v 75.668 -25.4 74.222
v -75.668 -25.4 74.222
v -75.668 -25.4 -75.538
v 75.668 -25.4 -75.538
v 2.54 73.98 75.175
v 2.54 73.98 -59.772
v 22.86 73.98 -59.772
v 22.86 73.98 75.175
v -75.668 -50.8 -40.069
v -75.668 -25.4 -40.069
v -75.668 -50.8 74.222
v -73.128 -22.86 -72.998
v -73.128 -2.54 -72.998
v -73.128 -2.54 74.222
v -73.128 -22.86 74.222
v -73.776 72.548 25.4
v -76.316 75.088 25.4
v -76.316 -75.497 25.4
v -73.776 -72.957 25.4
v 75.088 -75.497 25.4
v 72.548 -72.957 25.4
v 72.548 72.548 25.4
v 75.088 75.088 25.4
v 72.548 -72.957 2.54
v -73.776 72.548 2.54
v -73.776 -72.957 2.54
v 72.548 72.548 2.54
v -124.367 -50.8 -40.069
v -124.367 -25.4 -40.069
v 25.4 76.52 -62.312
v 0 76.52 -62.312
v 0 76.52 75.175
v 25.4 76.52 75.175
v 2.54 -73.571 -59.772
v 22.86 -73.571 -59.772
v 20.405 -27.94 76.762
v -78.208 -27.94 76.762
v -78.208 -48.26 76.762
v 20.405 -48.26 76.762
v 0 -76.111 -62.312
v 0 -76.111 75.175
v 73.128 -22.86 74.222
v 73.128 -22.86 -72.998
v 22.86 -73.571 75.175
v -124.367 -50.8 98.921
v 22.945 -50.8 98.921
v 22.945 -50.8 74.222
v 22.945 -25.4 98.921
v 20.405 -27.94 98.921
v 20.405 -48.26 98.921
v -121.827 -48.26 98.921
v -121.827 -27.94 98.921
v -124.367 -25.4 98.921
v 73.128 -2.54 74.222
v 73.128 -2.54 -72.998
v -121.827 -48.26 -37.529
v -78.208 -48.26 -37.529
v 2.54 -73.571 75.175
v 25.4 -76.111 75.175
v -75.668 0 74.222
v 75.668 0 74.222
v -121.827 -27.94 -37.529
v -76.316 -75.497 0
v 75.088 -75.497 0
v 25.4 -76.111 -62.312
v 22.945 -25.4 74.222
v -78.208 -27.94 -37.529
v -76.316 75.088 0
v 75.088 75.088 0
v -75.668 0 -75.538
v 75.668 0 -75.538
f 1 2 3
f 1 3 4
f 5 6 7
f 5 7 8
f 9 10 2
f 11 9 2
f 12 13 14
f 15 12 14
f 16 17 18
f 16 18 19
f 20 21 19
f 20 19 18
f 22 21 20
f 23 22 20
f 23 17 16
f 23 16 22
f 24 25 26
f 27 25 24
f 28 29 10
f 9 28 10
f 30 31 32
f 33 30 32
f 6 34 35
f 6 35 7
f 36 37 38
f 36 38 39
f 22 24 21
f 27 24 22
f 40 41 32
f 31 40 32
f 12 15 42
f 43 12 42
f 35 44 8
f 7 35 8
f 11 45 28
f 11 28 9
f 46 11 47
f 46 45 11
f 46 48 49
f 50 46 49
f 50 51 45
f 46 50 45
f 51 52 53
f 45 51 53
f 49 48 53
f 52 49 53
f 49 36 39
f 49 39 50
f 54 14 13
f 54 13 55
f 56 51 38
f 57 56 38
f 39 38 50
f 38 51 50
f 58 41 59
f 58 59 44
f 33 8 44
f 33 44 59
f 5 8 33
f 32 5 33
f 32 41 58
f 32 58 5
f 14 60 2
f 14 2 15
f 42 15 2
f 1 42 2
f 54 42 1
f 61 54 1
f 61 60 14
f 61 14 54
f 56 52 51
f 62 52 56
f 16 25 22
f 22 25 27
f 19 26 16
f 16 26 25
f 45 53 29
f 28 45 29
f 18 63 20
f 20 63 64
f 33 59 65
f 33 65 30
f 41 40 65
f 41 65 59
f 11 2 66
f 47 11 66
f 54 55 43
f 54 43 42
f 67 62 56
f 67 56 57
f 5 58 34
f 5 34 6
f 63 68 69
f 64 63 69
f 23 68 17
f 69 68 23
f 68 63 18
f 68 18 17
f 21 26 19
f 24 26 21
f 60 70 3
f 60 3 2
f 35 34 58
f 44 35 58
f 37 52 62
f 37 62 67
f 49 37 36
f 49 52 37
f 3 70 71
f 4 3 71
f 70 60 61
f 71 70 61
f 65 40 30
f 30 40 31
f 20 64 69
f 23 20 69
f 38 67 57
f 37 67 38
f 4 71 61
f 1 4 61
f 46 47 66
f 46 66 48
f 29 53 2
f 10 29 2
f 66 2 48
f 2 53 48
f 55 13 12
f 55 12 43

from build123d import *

# Parameters (mm, degrees)
F0_W     = 151.3367220759
F0_H     = 149.7606560588
F1_DEPTH = 25.4
F3_DEPTH = 25.4
F4_W     = 151.4038592577
F4_H     = 150.585450232
F5_DEPTH = 25.4
F6_W     = 152.6314616203
F6_H     = 137.4863237143
F7_DEPTH = 25.4
F8_T     = -2.54
F9_T     = -2.54
F10_T    = -2.54
F11_T    = -2.54


with BuildPart() as f1:
    # F0 (on Front) → F1 (new body)
    with BuildSketch(Plane.XZ):
        with Locations((3.7253e-06, -0.6579868495)):
            Rectangle(F0_W, F0_H)
    extrude(amount=F1_DEPTH)

    # F10
    f10_openings = [f1.faces().sort_by_distance(p)[0] for p in [
        (4e-06, -12.7, 74.222341),
    ]]
    offset(amount=F10_T, openings=f10_openings)


with BuildPart() as f3:
    # F2 (on face) → F3 (new body)
    with BuildSketch(Plane.XZ.offset(25.4)):
        Polygon((-124.3670582771, 98.9207774401), (-124.3670582771, -40.0690212846), (-75.6683573127, -40.0690212846), (-75.6683573127, 74.2223411798), (22.944804281, 74.2223411798), (22.944804281, 98.9207774401), align=None)
    extrude(amount=F3_DEPTH)

    # F8
    f8_openings = [f3.faces().sort_by_distance(p)[0] for p in [
        (-50.711127, -38.1, 98.920777),
    ]]
    offset(amount=F8_T, openings=f8_openings, kind=Kind.INTERSECTION)


with BuildPart() as f5:
    # F4 (on Top) → F5 (new body)
    with BuildSketch(Plane.XY):
        with Locations((-0.6138011813, -0.2045966685)):
            Rectangle(F4_W, F4_H)
    extrude(amount=F5_DEPTH)

    # F11
    f11_openings = [f5.faces().sort_by_distance(p)[0] for p in [
        (-0.613801, -0.204597, 25.4),
    ]]
    offset(amount=F11_T, openings=f11_openings)


with BuildPart() as f7:
    # F6 (on Right) → F7 (new body)
    with BuildSketch(Plane.YZ):
        with Locations((0.2046003938, 6.4316242933)):
            Rectangle(F6_W, F6_H)
    extrude(amount=F7_DEPTH)

    # F9
    f9_openings = [f7.faces().sort_by_distance(p)[0] for p in [
        (12.7, 0.2046, 75.174786),
    ]]
    offset(amount=F9_T, openings=f9_openings)


solid = Compound([f1.part, f3.part, f5.part, f7.part])
